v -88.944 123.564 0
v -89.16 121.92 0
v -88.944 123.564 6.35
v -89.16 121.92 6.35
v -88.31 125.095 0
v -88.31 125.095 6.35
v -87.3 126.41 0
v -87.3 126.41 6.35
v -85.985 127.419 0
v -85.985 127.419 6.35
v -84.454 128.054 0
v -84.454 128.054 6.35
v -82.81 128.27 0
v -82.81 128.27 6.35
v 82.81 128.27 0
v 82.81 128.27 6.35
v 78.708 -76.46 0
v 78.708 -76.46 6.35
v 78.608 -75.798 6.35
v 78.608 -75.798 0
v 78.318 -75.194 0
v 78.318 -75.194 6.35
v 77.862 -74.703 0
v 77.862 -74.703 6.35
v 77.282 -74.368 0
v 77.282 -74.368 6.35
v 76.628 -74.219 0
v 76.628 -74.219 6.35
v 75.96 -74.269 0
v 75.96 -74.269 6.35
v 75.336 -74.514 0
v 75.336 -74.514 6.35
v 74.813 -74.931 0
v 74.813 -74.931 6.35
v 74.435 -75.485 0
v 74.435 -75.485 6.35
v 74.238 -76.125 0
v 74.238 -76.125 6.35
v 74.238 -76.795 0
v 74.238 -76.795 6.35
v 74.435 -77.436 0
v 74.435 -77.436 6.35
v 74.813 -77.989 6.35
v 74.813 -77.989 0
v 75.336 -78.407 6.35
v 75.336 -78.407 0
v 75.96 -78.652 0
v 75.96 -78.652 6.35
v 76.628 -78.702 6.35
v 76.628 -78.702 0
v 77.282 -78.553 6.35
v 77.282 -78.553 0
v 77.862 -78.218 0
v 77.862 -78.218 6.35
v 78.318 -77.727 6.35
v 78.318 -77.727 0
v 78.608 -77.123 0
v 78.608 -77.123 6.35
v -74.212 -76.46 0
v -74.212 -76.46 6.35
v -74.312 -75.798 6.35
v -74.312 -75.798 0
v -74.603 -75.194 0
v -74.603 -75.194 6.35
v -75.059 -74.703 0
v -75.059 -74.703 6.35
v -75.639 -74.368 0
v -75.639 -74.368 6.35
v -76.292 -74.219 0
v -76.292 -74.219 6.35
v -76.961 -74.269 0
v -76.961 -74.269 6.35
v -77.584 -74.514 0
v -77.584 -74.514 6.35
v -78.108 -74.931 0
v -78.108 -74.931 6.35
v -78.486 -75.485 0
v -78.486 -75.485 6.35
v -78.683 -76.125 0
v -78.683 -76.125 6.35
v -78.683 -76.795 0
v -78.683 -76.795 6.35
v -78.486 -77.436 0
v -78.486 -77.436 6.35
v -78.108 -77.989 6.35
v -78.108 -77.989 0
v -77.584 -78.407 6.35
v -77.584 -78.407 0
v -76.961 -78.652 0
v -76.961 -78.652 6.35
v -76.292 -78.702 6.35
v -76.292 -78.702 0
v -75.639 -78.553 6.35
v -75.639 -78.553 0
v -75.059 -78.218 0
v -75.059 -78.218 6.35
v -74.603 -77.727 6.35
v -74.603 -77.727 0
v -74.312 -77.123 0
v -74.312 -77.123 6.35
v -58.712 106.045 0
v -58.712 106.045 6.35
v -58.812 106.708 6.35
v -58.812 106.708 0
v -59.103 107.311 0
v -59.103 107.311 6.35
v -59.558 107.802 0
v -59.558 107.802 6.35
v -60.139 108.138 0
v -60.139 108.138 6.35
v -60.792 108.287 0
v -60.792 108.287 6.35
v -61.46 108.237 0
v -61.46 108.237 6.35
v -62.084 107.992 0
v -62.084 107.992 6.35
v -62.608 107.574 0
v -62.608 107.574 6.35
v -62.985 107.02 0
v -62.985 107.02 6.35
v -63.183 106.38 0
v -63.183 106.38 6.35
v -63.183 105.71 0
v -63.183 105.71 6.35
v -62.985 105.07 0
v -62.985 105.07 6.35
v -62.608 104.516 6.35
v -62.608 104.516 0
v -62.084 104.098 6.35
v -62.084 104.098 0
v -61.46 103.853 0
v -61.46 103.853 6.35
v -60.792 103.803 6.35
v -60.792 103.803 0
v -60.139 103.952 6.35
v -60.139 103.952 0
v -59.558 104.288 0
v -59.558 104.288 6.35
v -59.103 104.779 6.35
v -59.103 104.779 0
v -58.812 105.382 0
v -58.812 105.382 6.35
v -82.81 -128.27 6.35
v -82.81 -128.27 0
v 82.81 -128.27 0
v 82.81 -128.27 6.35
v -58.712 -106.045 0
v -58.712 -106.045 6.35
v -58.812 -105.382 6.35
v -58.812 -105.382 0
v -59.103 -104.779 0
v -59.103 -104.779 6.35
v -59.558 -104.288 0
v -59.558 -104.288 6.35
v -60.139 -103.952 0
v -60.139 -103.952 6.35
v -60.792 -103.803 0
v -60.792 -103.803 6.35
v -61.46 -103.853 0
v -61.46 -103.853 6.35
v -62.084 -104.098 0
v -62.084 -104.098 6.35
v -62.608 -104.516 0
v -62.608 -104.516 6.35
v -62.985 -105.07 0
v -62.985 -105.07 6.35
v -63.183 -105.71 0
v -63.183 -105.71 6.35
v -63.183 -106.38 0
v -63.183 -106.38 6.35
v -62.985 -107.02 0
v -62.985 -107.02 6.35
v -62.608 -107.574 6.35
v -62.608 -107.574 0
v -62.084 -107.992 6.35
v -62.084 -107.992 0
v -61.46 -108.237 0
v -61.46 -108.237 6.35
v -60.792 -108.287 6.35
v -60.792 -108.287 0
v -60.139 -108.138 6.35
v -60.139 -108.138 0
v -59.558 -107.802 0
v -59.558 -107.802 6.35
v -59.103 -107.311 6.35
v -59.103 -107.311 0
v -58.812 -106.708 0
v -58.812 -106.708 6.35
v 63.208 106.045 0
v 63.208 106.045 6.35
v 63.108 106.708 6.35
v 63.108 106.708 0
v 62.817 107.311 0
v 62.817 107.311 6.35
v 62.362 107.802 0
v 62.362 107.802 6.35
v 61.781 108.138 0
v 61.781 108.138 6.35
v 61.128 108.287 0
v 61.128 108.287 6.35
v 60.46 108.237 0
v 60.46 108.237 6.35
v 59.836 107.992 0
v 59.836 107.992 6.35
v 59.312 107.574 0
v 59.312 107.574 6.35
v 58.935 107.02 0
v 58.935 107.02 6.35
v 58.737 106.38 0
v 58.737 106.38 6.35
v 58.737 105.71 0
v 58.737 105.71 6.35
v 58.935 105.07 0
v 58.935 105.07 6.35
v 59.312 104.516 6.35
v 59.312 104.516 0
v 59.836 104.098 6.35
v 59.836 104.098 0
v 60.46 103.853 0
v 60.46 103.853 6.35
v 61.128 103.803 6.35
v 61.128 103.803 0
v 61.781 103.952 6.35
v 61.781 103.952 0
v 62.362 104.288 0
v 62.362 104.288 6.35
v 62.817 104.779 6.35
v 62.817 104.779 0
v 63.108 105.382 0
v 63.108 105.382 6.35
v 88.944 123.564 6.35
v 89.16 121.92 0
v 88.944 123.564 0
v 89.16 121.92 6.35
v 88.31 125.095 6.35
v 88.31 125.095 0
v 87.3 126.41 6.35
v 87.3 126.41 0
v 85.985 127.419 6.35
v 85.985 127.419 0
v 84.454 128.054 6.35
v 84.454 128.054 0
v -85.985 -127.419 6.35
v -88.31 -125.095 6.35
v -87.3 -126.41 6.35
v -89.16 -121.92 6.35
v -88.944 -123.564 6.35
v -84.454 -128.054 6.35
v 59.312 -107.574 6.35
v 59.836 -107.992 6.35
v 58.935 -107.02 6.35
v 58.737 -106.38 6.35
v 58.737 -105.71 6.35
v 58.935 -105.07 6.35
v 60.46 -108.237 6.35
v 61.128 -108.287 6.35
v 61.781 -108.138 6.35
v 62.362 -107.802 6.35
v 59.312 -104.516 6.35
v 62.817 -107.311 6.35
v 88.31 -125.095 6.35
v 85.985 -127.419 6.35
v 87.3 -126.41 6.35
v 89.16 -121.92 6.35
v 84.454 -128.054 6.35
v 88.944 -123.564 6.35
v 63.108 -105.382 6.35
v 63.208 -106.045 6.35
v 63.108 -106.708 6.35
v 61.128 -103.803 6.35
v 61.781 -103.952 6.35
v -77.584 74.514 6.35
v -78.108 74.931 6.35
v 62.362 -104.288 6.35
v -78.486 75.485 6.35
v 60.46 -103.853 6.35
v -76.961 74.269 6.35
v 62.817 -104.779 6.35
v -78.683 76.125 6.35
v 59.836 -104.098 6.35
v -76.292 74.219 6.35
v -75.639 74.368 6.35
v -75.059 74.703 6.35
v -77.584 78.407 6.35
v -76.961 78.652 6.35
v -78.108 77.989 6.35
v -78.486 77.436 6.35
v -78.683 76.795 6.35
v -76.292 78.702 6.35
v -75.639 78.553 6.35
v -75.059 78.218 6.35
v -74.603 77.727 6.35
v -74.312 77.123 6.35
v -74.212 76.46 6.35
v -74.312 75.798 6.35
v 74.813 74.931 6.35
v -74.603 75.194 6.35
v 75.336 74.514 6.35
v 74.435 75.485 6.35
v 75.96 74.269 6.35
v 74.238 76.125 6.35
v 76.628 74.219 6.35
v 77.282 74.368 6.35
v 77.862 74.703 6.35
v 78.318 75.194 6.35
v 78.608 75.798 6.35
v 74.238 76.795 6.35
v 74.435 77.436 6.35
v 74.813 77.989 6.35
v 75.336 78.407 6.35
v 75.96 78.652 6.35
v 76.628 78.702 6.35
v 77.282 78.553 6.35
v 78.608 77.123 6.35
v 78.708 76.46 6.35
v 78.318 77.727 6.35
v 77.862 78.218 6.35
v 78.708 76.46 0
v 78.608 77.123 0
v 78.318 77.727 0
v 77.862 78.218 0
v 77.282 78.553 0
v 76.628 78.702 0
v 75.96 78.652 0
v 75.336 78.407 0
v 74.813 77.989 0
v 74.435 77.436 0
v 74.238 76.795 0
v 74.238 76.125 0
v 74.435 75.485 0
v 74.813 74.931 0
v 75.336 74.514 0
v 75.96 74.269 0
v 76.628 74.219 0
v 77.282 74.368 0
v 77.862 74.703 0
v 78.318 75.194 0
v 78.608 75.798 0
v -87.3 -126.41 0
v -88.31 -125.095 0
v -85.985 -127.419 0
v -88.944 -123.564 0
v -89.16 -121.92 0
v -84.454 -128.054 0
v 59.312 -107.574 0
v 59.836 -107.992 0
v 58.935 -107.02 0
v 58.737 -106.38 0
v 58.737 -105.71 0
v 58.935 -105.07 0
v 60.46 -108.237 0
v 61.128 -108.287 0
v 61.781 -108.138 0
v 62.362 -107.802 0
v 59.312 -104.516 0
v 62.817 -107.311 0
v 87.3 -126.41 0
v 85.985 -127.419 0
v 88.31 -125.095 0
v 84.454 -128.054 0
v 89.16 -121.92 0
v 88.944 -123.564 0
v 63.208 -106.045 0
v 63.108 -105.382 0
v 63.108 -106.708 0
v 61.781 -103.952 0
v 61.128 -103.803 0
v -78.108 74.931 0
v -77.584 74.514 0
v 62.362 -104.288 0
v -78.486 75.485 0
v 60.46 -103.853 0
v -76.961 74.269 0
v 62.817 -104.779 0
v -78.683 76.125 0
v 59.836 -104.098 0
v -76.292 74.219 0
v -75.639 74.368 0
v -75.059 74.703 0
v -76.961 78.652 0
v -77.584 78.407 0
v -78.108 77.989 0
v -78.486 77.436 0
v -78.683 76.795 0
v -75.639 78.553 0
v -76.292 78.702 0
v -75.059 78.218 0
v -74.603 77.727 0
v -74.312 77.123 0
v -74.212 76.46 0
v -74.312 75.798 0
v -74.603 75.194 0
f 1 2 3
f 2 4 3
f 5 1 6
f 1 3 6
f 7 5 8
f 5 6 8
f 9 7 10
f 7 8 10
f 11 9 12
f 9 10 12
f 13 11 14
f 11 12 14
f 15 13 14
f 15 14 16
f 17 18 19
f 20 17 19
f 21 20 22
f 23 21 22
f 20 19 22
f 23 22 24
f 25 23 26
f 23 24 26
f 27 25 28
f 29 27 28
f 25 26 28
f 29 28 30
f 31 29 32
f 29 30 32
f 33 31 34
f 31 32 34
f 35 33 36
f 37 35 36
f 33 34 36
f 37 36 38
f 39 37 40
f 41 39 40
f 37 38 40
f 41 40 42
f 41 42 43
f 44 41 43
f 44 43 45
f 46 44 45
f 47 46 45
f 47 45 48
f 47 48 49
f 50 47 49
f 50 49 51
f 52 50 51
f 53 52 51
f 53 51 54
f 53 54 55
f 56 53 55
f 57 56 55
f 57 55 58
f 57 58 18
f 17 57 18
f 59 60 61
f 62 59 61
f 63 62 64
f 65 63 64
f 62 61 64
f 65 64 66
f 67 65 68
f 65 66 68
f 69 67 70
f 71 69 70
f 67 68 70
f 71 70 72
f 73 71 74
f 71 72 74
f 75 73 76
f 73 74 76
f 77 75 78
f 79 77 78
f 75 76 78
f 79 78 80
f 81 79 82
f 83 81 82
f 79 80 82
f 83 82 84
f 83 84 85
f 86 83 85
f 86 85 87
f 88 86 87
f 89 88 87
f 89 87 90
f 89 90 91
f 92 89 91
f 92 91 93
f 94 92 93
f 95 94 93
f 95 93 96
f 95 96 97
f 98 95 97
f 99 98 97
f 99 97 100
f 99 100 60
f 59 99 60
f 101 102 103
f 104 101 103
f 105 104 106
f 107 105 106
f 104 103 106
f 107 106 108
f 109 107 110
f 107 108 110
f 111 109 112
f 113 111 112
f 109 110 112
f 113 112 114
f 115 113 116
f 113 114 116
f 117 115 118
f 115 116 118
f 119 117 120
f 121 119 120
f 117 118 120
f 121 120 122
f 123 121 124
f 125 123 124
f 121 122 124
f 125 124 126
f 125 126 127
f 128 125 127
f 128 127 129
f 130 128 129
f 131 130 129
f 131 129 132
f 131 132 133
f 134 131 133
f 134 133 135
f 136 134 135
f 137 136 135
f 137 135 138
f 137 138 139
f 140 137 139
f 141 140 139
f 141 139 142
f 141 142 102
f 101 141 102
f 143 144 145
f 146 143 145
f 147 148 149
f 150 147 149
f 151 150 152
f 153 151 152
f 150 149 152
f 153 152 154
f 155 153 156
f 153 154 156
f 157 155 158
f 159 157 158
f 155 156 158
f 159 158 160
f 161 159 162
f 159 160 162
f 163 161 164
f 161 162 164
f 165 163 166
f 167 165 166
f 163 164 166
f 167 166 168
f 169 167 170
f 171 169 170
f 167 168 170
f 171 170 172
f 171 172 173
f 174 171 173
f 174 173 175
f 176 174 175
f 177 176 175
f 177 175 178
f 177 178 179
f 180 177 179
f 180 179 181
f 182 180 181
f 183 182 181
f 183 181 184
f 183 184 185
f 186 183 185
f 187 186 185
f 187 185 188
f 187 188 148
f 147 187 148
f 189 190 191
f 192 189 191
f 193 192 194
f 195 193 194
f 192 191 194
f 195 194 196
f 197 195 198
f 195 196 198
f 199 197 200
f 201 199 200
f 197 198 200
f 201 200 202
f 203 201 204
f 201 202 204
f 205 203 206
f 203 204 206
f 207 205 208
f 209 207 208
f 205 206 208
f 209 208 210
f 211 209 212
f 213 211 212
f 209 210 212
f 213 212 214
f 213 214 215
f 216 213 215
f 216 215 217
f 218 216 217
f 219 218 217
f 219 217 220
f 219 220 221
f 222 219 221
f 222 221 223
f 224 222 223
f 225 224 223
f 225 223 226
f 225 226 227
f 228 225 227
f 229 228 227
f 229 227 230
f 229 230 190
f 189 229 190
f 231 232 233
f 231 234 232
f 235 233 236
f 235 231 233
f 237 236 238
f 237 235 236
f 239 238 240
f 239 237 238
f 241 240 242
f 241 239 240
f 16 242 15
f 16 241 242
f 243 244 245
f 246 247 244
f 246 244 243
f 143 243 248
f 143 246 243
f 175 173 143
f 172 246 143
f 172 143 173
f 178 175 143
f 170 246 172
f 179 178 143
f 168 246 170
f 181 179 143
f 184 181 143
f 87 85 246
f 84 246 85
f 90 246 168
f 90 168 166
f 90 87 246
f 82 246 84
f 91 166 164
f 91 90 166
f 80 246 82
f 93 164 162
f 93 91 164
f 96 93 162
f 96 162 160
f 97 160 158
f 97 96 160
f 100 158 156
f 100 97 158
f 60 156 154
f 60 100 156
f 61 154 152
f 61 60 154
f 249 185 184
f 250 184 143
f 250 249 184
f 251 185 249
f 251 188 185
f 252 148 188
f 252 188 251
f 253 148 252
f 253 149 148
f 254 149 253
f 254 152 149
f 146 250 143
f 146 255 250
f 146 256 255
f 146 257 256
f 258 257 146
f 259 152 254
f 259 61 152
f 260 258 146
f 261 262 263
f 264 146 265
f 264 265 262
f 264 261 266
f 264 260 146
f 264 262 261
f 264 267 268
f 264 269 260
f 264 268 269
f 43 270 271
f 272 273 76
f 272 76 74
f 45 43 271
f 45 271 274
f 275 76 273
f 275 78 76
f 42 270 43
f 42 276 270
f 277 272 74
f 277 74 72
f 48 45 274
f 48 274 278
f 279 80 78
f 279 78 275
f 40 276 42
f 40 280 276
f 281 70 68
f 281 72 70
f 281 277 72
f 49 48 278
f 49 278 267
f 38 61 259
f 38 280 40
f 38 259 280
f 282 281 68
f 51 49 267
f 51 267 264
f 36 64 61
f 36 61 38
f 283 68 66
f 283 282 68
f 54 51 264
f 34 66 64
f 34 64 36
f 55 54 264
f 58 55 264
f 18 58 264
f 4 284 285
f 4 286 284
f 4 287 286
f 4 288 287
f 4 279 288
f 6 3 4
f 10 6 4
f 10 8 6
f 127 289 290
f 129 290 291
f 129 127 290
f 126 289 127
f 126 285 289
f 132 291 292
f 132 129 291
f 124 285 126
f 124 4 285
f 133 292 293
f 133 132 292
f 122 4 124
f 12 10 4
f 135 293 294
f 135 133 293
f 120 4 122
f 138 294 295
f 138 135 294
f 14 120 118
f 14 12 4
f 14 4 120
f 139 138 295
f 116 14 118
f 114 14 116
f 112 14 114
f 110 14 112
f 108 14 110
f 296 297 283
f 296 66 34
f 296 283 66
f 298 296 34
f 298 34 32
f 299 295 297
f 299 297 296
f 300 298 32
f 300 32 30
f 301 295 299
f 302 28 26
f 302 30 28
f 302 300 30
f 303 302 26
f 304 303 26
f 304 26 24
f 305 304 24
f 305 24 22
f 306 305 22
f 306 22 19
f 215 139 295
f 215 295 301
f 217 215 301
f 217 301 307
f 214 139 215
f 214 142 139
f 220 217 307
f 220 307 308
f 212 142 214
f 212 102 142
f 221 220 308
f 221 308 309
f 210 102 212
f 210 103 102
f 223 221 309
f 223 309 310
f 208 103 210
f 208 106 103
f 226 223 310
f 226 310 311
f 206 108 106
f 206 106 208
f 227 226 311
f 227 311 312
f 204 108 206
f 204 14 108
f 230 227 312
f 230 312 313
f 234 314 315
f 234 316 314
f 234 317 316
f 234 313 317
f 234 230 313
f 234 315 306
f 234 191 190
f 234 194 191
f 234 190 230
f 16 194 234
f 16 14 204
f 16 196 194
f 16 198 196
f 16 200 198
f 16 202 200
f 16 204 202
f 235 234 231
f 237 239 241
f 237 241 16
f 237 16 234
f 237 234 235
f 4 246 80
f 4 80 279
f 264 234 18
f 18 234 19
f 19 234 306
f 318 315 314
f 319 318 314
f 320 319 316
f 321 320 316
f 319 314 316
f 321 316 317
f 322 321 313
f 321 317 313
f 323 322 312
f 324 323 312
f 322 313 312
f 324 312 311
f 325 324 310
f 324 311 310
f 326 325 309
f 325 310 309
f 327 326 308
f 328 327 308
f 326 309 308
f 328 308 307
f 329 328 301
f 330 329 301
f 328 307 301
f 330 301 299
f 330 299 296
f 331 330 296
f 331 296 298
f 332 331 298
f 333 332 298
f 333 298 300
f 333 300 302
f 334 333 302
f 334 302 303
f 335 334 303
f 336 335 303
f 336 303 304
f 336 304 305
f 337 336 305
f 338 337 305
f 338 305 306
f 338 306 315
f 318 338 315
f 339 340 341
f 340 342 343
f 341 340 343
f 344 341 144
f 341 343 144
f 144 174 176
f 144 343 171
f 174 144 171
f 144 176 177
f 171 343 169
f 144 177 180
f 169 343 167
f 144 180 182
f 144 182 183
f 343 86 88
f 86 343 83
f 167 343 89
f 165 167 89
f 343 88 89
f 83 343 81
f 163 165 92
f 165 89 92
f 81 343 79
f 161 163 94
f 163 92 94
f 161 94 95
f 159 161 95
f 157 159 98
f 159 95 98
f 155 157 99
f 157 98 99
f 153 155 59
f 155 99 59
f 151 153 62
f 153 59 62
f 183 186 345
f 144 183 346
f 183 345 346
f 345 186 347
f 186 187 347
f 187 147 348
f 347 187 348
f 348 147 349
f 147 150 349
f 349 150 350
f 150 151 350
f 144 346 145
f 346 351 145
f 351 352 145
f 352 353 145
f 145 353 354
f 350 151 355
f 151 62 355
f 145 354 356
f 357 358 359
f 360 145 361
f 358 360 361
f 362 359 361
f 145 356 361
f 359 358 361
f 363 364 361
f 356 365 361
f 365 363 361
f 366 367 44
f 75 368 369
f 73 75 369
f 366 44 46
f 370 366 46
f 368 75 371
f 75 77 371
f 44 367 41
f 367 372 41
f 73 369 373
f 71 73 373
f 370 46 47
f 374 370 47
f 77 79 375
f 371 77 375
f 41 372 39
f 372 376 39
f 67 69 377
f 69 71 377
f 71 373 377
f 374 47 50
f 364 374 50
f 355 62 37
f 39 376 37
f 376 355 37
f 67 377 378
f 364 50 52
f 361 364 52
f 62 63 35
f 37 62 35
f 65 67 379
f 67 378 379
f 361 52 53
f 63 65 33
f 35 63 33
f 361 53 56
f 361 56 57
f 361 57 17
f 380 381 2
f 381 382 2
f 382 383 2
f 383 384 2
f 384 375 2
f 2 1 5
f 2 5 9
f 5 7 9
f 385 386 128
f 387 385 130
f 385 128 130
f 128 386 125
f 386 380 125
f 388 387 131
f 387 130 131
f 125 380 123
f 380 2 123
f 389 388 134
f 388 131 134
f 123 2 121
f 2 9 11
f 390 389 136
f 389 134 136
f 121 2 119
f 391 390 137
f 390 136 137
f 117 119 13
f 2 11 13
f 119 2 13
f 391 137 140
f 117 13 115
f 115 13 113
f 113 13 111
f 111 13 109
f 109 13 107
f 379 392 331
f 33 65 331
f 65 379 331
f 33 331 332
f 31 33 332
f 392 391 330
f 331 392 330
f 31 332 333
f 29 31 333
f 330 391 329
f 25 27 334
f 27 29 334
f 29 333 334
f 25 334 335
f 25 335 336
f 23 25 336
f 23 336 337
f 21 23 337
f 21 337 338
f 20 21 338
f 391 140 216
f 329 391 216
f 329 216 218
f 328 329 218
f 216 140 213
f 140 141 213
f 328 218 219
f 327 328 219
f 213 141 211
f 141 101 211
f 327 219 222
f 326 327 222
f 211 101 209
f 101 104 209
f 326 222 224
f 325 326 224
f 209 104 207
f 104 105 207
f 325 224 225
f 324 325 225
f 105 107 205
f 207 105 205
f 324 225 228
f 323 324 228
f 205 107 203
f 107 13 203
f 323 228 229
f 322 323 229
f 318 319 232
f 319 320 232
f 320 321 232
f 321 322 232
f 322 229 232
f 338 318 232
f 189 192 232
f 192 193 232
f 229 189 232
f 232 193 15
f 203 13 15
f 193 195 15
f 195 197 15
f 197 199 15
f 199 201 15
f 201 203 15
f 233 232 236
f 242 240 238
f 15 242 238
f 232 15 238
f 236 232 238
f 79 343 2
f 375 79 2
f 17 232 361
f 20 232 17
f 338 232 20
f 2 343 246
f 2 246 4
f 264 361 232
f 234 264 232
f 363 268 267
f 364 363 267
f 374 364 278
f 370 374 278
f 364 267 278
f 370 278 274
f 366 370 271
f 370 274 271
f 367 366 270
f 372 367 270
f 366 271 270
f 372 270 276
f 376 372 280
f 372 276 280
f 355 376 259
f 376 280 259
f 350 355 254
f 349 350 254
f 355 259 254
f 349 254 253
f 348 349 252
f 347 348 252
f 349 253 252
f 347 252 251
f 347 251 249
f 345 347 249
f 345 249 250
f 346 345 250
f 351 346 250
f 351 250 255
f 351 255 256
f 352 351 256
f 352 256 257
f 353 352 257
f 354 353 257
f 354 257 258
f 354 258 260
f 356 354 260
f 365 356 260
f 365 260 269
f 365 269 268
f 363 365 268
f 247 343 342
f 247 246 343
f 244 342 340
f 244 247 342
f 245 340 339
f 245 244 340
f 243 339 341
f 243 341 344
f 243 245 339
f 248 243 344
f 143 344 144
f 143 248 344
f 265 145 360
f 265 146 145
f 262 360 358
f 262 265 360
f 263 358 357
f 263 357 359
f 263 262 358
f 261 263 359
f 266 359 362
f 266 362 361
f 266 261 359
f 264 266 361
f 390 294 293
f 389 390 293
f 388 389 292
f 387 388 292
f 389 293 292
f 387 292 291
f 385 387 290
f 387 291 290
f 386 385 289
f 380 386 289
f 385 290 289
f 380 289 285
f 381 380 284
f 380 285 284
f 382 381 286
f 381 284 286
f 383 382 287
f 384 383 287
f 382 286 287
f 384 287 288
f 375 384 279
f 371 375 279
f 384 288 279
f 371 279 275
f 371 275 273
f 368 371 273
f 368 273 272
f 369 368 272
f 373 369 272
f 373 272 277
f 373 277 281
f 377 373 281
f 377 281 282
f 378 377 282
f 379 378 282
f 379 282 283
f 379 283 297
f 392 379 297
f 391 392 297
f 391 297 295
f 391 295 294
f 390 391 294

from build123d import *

# Parameters (mm, degrees)
SKETCH1_W             = 178.3207
SKETCH1_H             = 256.54
BOSS_EXTRUDE1_DEPTH   = 6.35
FILLET1_R             = 6.35
F_8_CLEARANCE_HOLE1_D = 4.4958


with BuildPart() as part:
    # Sketch1 → Boss-Extrude1 (new body)
    with BuildSketch(Plane.XY):
        Rectangle(SKETCH1_W, SKETCH1_H)
    extrude(amount=BOSS_EXTRUDE1_DEPTH)

    # Fillet1
    fillet1_edges = [part.edges().sort_by_distance(p)[0] for p in [
        (89.16035, -128.27, 3.175),
        (-89.16035, -128.27, 3.175),
        (-89.16035, 128.27, 3.175),
        (89.16035, 128.27, 3.175),
    ]]
    fillet(fillet1_edges, radius=FILLET1_R)

    # #8 Clearance Hole1 (through all)
    with Locations(Plane(origin=(0, 0, 0), x_dir=(-1, 0, 0), z_dir=(0, 0, -1))):
        with Locations((-60.96, 106.045), (60.96, 106.045), (-60.96, -106.045), (60.96, -106.045), (-76.46035, -76.46035), (-76.46035, 76.46035), (76.46035, 76.46035), (76.46035, -76.46035)):
            Hole(F_8_CLEARANCE_HOLE1_D / 2)


solid = part.part
